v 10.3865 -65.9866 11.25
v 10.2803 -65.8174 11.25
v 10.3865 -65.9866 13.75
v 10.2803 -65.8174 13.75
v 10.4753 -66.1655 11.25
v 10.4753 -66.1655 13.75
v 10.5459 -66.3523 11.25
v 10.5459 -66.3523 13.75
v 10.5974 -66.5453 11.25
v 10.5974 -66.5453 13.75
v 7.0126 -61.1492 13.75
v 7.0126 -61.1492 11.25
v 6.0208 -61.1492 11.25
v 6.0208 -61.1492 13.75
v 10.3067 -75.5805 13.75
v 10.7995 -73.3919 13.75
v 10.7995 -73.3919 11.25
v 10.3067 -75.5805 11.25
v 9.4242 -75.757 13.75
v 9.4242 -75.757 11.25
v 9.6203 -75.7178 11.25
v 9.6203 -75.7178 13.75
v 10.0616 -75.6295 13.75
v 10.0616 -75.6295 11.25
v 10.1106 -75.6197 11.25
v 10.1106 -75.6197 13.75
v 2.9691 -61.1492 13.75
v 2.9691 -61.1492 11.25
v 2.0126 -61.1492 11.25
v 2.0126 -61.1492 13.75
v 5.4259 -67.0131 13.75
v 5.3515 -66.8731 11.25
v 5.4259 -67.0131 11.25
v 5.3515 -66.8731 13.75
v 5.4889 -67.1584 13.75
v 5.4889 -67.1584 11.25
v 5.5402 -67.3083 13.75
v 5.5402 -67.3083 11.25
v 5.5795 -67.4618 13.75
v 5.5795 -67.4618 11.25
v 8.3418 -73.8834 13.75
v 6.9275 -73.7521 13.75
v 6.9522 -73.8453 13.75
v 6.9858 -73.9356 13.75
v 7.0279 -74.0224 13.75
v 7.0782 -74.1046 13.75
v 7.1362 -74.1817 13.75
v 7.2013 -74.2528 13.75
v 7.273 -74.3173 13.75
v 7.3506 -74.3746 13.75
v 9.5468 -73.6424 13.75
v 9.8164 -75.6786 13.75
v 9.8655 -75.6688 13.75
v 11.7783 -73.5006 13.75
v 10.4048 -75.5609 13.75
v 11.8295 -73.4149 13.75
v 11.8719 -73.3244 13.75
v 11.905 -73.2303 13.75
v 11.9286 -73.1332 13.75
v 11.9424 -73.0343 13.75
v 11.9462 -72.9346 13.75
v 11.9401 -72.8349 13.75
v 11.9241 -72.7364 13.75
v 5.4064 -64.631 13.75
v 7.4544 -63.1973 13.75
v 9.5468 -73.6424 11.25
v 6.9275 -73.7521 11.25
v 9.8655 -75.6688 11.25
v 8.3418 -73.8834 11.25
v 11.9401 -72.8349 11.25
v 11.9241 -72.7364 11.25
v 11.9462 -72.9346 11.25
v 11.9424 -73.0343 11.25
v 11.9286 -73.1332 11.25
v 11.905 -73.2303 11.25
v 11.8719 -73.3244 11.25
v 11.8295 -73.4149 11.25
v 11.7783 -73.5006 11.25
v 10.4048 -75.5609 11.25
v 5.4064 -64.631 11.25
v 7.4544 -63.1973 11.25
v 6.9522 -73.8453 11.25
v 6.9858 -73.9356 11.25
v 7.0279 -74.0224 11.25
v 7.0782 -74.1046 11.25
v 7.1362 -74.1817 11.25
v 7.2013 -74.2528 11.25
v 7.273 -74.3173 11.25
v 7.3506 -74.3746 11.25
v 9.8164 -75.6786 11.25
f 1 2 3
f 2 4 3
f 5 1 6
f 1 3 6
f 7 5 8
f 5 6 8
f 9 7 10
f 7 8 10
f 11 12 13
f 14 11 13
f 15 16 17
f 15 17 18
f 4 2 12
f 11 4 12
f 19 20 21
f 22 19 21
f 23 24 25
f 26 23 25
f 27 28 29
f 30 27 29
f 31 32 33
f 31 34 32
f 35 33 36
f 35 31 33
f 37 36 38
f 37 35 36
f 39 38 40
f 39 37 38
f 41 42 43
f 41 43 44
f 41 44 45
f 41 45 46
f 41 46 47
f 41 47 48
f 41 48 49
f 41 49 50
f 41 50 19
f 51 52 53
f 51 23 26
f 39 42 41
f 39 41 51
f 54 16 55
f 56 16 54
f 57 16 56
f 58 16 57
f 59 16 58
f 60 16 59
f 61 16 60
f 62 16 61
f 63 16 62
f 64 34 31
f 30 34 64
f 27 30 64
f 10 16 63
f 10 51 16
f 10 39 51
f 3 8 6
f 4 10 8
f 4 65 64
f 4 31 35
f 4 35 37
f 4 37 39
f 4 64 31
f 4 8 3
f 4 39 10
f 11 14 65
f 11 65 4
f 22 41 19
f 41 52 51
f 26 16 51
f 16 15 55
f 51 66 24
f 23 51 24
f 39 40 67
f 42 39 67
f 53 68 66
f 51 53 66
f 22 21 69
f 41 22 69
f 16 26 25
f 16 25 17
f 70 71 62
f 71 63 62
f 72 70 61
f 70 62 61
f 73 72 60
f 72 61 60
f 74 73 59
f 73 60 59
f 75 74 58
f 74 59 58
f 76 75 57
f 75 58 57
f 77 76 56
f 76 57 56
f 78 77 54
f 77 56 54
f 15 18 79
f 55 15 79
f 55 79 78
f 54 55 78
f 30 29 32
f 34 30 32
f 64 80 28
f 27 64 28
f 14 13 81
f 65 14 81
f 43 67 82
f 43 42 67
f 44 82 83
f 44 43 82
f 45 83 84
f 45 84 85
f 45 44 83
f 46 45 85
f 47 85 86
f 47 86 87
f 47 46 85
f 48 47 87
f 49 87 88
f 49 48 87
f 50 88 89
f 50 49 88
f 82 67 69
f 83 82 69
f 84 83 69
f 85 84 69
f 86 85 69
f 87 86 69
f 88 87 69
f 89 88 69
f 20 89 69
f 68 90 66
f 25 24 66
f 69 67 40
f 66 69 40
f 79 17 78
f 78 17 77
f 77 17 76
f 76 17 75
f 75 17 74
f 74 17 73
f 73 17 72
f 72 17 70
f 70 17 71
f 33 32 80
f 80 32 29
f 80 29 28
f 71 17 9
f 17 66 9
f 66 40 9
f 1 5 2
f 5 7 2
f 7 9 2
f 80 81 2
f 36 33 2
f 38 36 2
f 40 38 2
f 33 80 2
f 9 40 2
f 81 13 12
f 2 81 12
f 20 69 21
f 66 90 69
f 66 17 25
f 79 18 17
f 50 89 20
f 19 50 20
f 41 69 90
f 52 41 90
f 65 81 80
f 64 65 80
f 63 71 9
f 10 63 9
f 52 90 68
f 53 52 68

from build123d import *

# Parameters (mm, degrees)
MAIN_EXTRUDE_DEPTH    = 25
BOTTOM_FOOT_CUT_DEPTH = 26
TALON_CUTS_DEPTH      = 26
ANKLE_FILLETS_R       = 10
INNER_LEG_FILLET_R    = 20
KNEE_FILLET_R         = 20
SCALE1_SCALE          = 0.1
CUT_EXTRUDE3_REACH    = 4.5


with BuildPart() as part:
    # Sketch6 → Main Extrude (new body)
    with BuildSketch(Plane.XY):
        Polygon((0, 0), (-50, 0), (-15, -60), (0, -130), (30, -150), (50, -120), (35, -50), align=None)
    extrude(amount=MAIN_EXTRUDE_DEPTH)

    # Sketch9 → Bottom Foot Cut (cut, through all)
    with BuildSketch(Plane(origin=(0, 0, 0), x_dir=(-1, 0, 0), z_dir=(0, 0, -1))):
        Polygon((-30, -150), (-24.116515946, -146.077677297), (-33.922322703, -144.116515946), align=None)
    extrude(amount=-BOTTOM_FOOT_CUT_DEPTH, mode=Mode.SUBTRACT)

    # Sketch11 → Talon Cuts (cut, through all)
    with BuildSketch(Plane(origin=(0, 0, 0), x_dir=(-1, 0, 0), z_dir=(0, 0, -1))):
        Polygon((-32.941742027, -144.312632081), (-30.980580676, -144.704864351), (-37.869672024, -122.426065595), align=None)
        Polygon((-30.490290338, -144.802922419), (-28.529128986, -145.195154689), (-25.342297799, -124.93154044), align=None)
        Polygon((-28.038838649, -145.293212757), (-26.077677297, -145.685445027), (-13.292661468, -127.341467706), align=None)
    extrude(amount=-TALON_CUTS_DEPTH, mode=Mode.SUBTRACT)

    # Ankle Fillets
    ankle_fillets_edges = [part.edges().sort_by_distance(p)[0] for p in [
        (50, -120, 12.5),
        (0, -130, 12.5),
    ]]
    fillet(ankle_fillets_edges, radius=ANKLE_FILLETS_R)

    # Inner Leg Fillet
    inner_leg_fillet_edges = [part.edges().sort_by_distance(p)[0] for p in [
        (-15, -60, 12.5),
    ]]
    fillet(inner_leg_fillet_edges, radius=INNER_LEG_FILLET_R)

    # Knee Fillet
    knee_fillet_edges = [part.edges().sort_by_distance(p)[0] for p in [
        (35, -50, 12.5),
    ]]
    fillet(knee_fillet_edges, radius=KNEE_FILLET_R)


with BuildPart() as part_1:
    # Scale1: scaled about (7.791739568, -67.94361037, 12.5)
    add(part.part.scale(SCALE1_SCALE).moved(Location((7.012565611, -61.149249333, 11.25))))

    # Sketch12 → Cut-Extrude3 (cut, up to next)
    with BuildSketch(Plane(origin=(0, 0, 11.25), x_dir=(-1, 0, 0), z_dir=(0, 0, -1)), mode=Mode.PRIVATE) as cut_extrude3_sk1:
        Polygon((-6.020782968, -61.149249333), (-7.454438828, -63.197329134), (-5.406359027, -64.630984995), (-2.969144064, -61.149249333), align=None)
    cut_extrude3_tool1 = extrude(cut_extrude3_sk1.sketch, amount=-CUT_EXTRUDE3_REACH, mode=Mode.PRIVATE) & part_1.part
    add(cut_extrude3_tool1.solids().sort_by_distance((5.352502, -62.562677, 11.25))[0], mode=Mode.SUBTRACT)


solid = part_1.part
